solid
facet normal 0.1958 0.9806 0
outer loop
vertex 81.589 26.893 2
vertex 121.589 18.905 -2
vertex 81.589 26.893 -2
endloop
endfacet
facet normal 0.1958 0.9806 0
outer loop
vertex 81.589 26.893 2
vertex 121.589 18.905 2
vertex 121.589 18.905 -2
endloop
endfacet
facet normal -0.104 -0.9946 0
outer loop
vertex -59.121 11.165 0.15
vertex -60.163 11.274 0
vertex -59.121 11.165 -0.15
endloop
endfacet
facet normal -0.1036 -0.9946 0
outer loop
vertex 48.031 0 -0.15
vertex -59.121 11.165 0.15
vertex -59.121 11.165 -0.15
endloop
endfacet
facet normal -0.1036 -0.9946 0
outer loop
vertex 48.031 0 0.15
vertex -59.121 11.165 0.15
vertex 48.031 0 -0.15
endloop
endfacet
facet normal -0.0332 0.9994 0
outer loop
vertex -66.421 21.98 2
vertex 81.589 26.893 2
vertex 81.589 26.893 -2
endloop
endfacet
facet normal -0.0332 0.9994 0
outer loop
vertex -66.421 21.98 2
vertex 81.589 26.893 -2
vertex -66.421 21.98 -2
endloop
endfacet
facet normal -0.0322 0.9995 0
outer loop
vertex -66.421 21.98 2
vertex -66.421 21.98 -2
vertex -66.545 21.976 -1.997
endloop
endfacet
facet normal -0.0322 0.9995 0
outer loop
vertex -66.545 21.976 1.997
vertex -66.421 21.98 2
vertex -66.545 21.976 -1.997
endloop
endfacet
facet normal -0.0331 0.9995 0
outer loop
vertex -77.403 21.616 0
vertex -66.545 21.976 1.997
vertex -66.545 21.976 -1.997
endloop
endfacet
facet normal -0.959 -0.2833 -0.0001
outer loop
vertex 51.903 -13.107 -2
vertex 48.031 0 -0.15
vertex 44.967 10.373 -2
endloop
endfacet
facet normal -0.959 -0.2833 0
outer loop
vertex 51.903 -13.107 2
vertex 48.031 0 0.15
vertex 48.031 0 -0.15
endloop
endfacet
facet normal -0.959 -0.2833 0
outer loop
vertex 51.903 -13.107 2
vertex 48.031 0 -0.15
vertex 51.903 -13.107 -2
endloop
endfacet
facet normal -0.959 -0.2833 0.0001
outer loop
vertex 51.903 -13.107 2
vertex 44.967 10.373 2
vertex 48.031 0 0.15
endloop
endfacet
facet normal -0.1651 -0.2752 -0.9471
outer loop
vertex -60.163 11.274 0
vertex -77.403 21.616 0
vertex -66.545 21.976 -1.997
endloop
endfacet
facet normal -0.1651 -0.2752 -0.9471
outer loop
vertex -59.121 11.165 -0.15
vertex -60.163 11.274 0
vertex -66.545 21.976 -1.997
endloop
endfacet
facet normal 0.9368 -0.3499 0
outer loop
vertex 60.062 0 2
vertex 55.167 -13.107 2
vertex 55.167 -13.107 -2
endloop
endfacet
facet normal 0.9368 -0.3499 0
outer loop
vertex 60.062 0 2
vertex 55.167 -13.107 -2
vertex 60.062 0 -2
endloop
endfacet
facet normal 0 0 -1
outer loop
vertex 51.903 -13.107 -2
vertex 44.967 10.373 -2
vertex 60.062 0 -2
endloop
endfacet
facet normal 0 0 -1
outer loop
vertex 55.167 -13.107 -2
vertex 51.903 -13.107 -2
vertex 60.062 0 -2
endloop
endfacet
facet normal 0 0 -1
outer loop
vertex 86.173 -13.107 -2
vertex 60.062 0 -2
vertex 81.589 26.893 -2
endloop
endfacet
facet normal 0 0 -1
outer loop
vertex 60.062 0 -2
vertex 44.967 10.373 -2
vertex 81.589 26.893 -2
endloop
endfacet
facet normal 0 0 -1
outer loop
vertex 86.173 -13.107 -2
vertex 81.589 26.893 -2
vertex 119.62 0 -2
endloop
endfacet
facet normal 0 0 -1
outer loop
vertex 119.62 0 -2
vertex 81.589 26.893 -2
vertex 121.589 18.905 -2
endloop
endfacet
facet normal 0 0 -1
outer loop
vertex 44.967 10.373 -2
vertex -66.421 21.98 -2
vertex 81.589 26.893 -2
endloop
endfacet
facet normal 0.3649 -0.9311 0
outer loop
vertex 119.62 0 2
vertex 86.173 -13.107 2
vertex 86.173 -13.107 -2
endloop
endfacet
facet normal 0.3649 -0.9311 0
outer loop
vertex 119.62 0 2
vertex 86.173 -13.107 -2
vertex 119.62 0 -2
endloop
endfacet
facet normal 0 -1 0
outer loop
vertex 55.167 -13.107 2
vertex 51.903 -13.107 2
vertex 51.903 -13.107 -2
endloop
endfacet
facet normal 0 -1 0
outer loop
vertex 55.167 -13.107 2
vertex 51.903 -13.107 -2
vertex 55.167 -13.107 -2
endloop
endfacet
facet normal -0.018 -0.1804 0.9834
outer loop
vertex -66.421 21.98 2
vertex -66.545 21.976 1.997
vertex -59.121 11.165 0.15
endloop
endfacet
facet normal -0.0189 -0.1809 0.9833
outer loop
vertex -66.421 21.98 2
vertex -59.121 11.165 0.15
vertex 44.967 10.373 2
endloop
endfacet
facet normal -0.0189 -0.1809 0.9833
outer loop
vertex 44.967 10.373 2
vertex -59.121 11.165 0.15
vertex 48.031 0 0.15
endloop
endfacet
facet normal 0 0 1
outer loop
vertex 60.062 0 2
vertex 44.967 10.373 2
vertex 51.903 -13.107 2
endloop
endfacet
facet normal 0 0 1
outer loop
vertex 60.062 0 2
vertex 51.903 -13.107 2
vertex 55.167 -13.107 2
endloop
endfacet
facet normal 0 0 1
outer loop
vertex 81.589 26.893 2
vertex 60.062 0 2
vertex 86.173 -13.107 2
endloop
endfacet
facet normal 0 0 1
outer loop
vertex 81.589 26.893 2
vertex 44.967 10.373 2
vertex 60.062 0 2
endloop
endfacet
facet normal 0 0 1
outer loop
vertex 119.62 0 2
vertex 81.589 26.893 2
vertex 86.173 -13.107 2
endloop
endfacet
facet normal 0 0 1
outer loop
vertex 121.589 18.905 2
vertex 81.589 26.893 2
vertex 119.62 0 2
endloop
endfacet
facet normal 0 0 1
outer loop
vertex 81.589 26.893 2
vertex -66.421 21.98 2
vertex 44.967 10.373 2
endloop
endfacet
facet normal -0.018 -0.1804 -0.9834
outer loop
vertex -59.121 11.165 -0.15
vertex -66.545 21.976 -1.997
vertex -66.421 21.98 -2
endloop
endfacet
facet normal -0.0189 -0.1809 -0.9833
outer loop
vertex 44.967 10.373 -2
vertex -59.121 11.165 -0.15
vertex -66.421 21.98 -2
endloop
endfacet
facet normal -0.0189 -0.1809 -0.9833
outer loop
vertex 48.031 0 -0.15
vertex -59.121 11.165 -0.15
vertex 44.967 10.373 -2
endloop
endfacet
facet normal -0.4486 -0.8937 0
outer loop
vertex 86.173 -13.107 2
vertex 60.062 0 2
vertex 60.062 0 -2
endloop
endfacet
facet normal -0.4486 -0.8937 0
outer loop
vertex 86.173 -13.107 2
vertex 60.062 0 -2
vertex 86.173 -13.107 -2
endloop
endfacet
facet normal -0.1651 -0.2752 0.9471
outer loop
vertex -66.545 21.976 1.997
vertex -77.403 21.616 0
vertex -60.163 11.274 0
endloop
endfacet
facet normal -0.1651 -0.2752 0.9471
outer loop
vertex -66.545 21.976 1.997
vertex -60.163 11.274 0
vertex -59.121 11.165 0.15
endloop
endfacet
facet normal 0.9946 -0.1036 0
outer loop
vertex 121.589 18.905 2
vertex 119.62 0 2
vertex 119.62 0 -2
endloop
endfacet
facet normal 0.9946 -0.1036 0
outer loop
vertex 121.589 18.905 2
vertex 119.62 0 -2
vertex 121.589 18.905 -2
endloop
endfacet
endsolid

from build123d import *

# Parameters (mm, degrees)
F1_DEPTH    = 2
F2_SIZE2    = 1.85
F2_SIZE     = 10
F2_2_SIZE2  = 1.85
F2_2_SIZE   = 10
F3_T1_DEPTH = 63.0781913019
F3_T3_DEPTH = 63.0781913019


# Not quite as in the source:
# - a fillet or chamfer that OpenCascade refuses, or shapes differently, is made with other operations: its cross-section is extruded or revolved along the edge and cut away or added


with BuildPart() as f1:
    # F0 (on Top) → F1 (new body, symmetric)
    with BuildSketch(Plane.XY):
        Polygon((-78.3224657339, 21.585099696), (-72.0955598013, 12.517264094), (48.031361701, 0), (51.9027564591, -13.106621107), (55.166546928, -13.106621107), (60.0622307678, 0), (86.172547065, -13.106621107), (119.6195638295, 0), (121.5894543095, 18.9048403295), (81.5894543095, 26.893378893), align=None)
    extrude(amount=F1_DEPTH, both=True)

    # F2
    f2_edges = [f1.edges().sort_by_distance(p)[0] for p in [
        (-12.032099, 6.258632, 2),
    ]]
    f2_side = f1.faces().sort_by_distance((40.734375, 11.652616, 2))[0]
    chamfer(f2_edges, length=F2_SIZE, length2=F2_SIZE2, reference=f2_side)

    # F2#2
    f2_2_edges = [f1.edges().sort_by_distance(p)[0] for p in [
        (-12.032099, 6.258632, -2),
    ]]
    f2_2_side = f1.faces().sort_by_distance((40.734375, 11.652616, -2))[0]
    chamfer(f2_2_edges, length=F2_2_SIZE, length2=F2_2_SIZE2, reference=f2_2_side)

    # F3: chamfer of 1.85 x 10 on 2 edges, made by hand

    # F3_s2 → F3_t1 (cut)
    with BuildSketch(Plane(origin=(-49.185702612, 71.6259198522, -12.2363892176), x_dir=(0.8243486911, 0.5660823575, 0), z_dir=(0.5605509501, -0.8162936645, 0.1394535249))):
        Polygon((-52.3460779882, 8.8318101599), (-42.4159004982, 5.802159781), (-52.3460779882, 6.9818101599), align=None)
    extrude(amount=F3_T1_DEPTH, mode=Mode.SUBTRACT)

    # F3_s4 → F3_t3 (cut)
    with BuildSketch(Plane(origin=(-49.185702612, 71.6259198522, 12.2363892176), x_dir=(0.8243486911, 0.5660823575, 0), z_dir=(0.5605509501, -0.8162936645, -0.1394535249))):
        Polygon((-52.3460779882, -8.8318101599), (-42.4159004982, -5.802159781), (-52.3460779882, -6.9818101599), align=None)
    extrude(amount=F3_T3_DEPTH, mode=Mode.SUBTRACT)


solid = f1.part
